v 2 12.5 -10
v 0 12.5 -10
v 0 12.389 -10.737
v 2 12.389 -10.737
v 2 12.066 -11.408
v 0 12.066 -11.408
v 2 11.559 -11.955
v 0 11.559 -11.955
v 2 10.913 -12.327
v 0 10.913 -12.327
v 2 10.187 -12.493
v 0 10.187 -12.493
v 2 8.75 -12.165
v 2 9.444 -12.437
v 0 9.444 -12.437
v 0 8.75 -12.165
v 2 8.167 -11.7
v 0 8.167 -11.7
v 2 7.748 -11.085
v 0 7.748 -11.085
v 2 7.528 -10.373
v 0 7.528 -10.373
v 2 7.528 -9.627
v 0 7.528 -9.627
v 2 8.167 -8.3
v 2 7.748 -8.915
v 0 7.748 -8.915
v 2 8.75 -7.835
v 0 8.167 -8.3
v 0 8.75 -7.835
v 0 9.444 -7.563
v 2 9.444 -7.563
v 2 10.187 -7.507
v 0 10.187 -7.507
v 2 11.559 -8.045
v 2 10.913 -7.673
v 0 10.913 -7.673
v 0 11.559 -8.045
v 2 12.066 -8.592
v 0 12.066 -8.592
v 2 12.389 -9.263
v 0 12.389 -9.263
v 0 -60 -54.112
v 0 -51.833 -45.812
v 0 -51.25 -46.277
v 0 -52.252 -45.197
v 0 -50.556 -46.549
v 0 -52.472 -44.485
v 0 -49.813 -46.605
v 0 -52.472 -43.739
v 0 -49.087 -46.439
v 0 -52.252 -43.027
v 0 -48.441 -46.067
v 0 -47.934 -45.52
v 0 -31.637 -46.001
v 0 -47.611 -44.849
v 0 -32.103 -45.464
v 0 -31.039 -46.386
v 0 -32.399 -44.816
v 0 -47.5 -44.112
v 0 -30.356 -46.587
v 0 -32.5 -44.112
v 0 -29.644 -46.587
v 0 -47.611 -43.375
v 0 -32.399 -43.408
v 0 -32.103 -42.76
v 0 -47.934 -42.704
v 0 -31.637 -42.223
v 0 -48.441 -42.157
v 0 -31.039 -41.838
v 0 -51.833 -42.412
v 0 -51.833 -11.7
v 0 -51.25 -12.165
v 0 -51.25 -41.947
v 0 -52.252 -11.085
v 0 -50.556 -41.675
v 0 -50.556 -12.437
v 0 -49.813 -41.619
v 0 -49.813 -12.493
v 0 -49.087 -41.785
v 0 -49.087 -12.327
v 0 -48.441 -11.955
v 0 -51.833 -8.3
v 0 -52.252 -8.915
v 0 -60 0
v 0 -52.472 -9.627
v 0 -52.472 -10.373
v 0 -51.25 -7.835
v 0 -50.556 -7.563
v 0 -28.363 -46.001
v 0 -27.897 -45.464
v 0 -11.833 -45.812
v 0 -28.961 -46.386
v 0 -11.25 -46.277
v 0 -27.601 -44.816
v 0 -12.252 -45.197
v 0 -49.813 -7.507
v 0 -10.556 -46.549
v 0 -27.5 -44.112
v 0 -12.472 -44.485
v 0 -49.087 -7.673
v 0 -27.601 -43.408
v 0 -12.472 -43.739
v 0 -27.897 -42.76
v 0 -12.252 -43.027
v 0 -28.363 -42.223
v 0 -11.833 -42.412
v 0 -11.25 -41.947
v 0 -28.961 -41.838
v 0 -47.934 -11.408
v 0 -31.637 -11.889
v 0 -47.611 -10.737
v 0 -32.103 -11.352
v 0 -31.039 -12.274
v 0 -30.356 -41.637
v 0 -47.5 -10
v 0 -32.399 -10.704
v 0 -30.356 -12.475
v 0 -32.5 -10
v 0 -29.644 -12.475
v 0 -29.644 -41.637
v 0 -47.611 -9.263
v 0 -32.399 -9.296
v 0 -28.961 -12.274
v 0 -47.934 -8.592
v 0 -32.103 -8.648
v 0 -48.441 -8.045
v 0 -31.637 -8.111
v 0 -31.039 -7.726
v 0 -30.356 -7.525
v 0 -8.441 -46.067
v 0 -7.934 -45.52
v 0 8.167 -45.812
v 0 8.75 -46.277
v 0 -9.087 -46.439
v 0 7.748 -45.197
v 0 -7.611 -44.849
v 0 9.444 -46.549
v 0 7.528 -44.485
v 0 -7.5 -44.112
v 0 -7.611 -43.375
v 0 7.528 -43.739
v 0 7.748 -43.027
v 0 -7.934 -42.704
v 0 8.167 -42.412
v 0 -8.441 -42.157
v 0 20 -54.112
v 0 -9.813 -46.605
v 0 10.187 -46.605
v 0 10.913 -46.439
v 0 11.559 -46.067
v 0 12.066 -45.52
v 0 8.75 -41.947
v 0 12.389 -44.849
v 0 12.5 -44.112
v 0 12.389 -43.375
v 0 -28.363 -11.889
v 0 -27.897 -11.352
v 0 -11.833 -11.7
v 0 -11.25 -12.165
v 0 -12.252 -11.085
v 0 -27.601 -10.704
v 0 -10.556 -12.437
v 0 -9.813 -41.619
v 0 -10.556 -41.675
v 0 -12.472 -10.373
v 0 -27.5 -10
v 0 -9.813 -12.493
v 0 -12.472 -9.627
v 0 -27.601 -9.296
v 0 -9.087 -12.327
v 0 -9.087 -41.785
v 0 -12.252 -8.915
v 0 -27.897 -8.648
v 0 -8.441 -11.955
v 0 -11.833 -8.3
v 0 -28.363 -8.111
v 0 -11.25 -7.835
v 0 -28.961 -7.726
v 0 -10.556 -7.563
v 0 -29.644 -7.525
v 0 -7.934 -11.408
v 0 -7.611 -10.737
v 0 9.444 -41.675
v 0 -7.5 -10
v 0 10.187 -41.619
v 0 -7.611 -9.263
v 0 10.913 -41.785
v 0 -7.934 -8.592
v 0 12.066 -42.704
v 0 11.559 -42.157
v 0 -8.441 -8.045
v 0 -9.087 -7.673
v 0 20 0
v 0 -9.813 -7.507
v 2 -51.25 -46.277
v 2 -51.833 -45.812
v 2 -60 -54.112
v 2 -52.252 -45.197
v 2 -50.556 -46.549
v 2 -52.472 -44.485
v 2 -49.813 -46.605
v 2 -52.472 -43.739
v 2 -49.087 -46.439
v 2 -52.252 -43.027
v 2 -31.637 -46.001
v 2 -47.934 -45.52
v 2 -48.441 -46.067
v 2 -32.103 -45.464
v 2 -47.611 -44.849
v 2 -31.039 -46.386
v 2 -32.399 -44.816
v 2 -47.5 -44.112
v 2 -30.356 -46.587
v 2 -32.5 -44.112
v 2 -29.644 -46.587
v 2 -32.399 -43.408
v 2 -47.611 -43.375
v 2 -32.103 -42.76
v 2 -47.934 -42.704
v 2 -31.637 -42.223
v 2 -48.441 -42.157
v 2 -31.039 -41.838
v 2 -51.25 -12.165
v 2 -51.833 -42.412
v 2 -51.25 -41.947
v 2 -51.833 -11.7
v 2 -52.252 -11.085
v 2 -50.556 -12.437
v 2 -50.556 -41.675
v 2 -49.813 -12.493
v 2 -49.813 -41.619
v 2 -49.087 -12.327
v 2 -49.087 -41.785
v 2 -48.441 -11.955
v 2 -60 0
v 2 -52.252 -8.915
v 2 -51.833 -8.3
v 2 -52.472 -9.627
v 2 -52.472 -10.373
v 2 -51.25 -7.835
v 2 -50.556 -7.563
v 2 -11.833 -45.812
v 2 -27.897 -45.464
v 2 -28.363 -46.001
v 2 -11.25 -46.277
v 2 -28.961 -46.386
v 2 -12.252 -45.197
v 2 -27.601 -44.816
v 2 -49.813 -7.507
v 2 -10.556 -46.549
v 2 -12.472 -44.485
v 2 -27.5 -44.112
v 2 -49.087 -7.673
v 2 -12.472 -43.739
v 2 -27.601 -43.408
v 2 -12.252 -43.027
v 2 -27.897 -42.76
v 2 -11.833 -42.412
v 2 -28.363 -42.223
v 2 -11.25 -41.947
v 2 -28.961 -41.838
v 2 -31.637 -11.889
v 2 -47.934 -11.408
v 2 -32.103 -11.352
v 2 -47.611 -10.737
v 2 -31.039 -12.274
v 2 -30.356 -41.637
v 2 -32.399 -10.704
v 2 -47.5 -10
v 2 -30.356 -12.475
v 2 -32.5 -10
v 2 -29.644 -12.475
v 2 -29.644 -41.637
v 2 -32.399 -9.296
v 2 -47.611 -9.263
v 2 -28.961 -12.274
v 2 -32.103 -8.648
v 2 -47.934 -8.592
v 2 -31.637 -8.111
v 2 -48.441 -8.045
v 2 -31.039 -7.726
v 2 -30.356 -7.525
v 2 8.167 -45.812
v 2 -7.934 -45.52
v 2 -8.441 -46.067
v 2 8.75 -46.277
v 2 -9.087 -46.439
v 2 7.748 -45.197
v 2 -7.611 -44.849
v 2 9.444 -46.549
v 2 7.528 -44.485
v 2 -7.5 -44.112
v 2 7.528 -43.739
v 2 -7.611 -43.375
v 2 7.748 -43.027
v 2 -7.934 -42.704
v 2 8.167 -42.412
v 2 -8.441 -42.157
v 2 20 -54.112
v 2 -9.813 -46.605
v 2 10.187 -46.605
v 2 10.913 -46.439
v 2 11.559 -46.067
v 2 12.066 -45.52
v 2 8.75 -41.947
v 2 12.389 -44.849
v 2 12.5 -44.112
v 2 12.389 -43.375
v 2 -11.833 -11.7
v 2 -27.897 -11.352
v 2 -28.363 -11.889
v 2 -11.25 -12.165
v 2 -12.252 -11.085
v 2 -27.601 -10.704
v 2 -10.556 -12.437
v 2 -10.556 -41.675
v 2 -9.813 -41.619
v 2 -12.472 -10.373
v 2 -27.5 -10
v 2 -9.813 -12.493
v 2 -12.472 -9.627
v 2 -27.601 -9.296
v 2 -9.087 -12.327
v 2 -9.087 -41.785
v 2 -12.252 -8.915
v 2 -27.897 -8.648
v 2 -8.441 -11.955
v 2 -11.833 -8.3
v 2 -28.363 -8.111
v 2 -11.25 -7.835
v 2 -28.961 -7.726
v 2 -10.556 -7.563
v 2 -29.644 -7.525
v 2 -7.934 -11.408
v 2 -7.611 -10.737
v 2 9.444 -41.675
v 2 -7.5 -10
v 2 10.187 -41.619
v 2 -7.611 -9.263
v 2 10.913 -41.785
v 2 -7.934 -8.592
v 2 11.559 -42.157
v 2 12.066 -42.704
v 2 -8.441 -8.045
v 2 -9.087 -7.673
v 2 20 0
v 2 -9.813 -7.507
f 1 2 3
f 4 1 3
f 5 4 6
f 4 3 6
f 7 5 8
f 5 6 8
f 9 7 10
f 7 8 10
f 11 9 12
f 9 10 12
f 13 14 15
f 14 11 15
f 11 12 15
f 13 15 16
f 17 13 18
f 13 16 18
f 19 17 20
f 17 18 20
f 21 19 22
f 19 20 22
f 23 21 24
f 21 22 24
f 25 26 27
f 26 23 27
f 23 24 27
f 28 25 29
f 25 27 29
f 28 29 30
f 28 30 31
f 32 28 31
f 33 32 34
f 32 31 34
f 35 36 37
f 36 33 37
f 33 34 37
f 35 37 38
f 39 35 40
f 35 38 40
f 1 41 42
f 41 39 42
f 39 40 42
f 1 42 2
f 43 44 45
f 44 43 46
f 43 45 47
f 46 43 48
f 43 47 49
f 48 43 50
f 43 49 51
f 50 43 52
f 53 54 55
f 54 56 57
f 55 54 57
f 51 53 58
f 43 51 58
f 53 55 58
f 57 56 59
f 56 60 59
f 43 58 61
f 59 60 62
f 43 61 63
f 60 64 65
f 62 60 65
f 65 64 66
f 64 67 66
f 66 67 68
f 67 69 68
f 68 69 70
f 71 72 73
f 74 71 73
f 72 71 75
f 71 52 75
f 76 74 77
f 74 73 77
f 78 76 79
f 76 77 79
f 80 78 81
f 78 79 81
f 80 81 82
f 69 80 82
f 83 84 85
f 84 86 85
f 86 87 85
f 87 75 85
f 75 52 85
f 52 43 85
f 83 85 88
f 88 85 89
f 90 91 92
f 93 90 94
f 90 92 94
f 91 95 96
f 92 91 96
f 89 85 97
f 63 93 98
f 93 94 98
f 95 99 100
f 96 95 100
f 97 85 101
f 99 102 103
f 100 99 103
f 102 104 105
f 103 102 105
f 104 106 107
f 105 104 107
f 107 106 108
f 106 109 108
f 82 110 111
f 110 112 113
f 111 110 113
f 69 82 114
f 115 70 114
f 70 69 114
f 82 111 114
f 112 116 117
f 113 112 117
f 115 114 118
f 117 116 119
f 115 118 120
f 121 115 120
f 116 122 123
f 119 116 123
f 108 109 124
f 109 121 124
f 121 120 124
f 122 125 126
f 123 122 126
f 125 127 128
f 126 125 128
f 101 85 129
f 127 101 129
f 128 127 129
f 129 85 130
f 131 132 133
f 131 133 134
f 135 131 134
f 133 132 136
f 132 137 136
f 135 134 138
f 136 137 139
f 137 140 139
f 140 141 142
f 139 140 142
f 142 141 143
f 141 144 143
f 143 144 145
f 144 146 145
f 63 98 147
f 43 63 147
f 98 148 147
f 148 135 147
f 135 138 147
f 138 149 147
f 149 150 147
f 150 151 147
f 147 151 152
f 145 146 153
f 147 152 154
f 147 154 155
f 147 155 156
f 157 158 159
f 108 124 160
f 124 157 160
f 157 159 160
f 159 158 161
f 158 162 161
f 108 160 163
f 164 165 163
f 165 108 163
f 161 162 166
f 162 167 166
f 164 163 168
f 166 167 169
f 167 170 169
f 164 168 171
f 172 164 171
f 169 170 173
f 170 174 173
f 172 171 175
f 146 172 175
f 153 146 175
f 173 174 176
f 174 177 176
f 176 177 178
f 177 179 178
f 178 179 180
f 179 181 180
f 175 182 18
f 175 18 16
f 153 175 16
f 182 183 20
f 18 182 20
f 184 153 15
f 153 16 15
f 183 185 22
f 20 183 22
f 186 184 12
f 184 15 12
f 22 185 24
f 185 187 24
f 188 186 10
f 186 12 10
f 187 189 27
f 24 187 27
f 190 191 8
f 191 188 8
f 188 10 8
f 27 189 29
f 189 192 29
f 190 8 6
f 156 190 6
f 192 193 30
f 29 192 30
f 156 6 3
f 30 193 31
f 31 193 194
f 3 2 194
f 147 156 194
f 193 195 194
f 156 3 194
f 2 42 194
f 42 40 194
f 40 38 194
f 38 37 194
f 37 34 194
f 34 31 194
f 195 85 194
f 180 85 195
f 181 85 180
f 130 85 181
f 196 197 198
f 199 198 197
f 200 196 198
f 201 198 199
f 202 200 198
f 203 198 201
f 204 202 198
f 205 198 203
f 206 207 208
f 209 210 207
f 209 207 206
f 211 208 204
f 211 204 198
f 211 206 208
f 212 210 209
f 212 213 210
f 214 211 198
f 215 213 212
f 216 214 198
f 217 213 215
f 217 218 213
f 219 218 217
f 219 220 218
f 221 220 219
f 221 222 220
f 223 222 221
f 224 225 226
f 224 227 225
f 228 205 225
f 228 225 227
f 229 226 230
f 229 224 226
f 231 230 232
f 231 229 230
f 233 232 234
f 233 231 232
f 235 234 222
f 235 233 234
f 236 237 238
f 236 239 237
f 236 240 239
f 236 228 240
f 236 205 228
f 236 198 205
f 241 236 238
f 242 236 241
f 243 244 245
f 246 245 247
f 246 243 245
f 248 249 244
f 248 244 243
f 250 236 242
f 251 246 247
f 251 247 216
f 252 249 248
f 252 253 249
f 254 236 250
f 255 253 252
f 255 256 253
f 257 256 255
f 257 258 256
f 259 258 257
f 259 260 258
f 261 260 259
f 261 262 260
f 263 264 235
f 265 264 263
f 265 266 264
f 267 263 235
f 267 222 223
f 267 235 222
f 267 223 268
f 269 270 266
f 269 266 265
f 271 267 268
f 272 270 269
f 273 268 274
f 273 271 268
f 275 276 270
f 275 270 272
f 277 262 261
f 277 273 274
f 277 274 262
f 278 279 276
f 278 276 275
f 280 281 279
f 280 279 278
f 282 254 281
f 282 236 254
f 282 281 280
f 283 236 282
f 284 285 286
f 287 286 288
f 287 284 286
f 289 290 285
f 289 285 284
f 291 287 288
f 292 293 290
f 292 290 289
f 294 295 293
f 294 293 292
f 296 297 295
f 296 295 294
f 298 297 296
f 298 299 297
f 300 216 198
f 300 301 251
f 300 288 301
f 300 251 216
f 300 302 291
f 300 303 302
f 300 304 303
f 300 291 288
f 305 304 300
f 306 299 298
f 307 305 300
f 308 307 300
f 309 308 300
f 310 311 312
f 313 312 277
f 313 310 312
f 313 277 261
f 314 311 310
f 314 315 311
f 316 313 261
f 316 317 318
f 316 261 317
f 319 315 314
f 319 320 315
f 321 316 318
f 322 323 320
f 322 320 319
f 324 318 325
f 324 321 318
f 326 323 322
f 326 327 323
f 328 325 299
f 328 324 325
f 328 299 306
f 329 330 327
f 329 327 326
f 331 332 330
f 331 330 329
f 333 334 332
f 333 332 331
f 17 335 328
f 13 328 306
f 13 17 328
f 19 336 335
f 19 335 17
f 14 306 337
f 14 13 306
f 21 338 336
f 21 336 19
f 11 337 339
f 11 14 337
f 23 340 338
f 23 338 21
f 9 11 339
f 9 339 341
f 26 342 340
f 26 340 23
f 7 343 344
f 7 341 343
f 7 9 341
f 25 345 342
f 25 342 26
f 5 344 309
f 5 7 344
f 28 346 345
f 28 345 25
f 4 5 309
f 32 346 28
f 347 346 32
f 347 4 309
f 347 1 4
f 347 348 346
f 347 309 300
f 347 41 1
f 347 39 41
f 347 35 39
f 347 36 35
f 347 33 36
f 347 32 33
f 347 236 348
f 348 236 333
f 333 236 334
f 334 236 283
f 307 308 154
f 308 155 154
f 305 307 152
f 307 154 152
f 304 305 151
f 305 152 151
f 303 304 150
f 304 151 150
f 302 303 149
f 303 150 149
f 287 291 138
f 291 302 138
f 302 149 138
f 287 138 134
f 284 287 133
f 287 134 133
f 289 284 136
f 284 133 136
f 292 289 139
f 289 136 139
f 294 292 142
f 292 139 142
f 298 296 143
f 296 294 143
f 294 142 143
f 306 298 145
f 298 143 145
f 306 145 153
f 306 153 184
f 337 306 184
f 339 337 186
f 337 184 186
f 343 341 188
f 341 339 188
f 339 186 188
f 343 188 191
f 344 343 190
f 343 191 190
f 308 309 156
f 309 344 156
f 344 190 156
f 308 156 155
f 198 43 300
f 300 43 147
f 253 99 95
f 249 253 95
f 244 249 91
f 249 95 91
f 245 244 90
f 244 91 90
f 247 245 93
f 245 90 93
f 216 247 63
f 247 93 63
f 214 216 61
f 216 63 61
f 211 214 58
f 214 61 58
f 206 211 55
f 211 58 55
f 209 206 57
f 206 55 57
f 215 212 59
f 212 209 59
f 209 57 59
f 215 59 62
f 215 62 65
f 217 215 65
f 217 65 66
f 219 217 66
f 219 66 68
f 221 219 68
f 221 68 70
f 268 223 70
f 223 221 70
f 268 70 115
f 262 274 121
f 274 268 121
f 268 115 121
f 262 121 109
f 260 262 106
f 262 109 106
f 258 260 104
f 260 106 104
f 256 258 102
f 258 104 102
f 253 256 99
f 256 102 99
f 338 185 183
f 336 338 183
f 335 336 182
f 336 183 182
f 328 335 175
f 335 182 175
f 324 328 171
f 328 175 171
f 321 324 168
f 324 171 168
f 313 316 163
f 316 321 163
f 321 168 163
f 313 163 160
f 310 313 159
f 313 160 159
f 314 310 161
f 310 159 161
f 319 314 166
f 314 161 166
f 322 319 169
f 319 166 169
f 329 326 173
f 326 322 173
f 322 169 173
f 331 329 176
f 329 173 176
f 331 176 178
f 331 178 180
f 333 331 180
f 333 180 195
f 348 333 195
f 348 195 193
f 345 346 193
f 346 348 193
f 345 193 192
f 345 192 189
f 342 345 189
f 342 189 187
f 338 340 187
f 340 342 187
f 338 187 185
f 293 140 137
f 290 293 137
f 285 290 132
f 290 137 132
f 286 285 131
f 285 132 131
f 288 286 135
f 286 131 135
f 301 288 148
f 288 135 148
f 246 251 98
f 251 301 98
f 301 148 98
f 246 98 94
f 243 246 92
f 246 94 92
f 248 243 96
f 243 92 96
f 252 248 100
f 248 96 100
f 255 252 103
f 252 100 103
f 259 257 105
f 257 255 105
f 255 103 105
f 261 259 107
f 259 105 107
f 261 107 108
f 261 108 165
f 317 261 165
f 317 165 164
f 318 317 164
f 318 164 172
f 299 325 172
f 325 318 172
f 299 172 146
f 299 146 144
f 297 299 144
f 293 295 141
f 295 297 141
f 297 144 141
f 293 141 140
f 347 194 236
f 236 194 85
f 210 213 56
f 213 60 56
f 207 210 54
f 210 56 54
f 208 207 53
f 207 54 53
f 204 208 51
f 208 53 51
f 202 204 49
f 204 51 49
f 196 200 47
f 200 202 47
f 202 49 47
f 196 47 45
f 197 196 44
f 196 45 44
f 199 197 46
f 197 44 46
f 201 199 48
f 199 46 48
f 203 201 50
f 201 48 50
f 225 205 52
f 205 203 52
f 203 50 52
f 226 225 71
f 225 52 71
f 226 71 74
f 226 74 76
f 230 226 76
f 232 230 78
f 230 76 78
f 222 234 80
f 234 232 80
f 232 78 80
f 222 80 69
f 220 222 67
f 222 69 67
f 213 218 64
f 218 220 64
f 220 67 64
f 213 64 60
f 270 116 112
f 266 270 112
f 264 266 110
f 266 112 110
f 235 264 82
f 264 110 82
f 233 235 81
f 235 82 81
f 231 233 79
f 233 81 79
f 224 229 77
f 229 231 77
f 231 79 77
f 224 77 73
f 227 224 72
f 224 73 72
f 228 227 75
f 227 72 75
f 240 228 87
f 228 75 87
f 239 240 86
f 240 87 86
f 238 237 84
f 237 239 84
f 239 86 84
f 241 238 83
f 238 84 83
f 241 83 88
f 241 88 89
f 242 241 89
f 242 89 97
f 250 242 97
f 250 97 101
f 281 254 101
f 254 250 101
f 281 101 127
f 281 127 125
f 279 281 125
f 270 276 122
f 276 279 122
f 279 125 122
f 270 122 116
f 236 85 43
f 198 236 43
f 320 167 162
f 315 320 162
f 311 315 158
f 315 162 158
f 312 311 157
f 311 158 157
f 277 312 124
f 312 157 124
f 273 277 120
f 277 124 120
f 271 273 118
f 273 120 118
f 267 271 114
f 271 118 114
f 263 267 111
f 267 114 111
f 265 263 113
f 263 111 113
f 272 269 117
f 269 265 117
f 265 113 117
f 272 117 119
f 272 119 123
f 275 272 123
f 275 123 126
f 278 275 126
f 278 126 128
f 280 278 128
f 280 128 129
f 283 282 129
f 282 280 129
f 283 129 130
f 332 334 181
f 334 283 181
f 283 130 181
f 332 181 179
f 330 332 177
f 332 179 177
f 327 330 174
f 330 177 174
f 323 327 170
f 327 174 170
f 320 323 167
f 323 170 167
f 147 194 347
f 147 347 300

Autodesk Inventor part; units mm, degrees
ref_plane "YZ Plane" through (0, 0, 0) normal (1, 0, 0) x (0, 1, 0)
ref_plane "XZ Plane" through (0, 0, 0) normal (0, 1, 0) x (-1, 0, 0)
ref_plane "XY Plane" through (0, 0, 0) normal (0, 0, 1) x (1, 0, 0)
sketch "Sketch1" plane through (0, 0, 0) normal (1, 0, 0) x (0, 1, 0)
  line L0 (0, 0) -> (-40, 0)
  line L1 (-40, 0) -> (-40, -54.112)
  line L2 (-40, -54.112) -> (0, -54.112)
  line L3 (0, -54.112) -> (0, 0)
  line L4 (-40, -54.112) -> (-40, -44.112)
  line L5 (-40, -44.112) -> (-30, -44.112)
  line L6 (-40, 0) -> (-40, -10)
  line L7 (-40, -10) -> (-30, -10)
  line L8 (0, -10) -> (-10, -10)
  circle A0 centre (-10, -10) radius 2.5
  circle A1 centre (-30, -44.112) radius 2.5
  circle A2 centre (-30, -10) radius 2.5
  line L9 (-40, 0) -> (-60, 0)
  line L10 (-60, 0) -> (-60, -54.112)
  line L11 (-60, -54.112) -> (-40, -54.112)
  line L12 (-40, -54.112) -> (-40, 0)
  line L13 (0, 0) -> (20, 0)
  line L14 (20, 0) -> (20, -54.112)
  line L15 (20, -54.112) -> (0, -54.112)
  line L16 (0, -54.112) -> (0, 0)
  circle A3 centre (10, -10) radius 2.5
  circle A4 centre (-50, -44.112) radius 2.5
  circle A5 centre (-50, -10) radius 2.5
  line L17 (0, -54.112) -> (0, -44.112)
  line L18 (0, -44.112) -> (-10, -44.112)
  circle A6 centre (-10, -44.112) radius 2.5
  circle A7 centre (10, -44.112) radius 2.5
  dimension "d0" = 40
  dimension "d1" = 54.112
  dimension "d2" = 10
  dimension "d3" = 10
  dimension "d4" = 10
  dimension "d5" = 10
  dimension "d6" = 5
  dimension "d8" = 5
  dimension "d9" = 5
  dimension "d10" = 20
  dimension "d11" = 20
  dimension "d14" = 10
  dimension "d15" = 10
  dimension "d16" = 5
extrude "Extrusion1" add sketch "Sketch1" along normal blind 2
properties part number "H-Connector_2020"
